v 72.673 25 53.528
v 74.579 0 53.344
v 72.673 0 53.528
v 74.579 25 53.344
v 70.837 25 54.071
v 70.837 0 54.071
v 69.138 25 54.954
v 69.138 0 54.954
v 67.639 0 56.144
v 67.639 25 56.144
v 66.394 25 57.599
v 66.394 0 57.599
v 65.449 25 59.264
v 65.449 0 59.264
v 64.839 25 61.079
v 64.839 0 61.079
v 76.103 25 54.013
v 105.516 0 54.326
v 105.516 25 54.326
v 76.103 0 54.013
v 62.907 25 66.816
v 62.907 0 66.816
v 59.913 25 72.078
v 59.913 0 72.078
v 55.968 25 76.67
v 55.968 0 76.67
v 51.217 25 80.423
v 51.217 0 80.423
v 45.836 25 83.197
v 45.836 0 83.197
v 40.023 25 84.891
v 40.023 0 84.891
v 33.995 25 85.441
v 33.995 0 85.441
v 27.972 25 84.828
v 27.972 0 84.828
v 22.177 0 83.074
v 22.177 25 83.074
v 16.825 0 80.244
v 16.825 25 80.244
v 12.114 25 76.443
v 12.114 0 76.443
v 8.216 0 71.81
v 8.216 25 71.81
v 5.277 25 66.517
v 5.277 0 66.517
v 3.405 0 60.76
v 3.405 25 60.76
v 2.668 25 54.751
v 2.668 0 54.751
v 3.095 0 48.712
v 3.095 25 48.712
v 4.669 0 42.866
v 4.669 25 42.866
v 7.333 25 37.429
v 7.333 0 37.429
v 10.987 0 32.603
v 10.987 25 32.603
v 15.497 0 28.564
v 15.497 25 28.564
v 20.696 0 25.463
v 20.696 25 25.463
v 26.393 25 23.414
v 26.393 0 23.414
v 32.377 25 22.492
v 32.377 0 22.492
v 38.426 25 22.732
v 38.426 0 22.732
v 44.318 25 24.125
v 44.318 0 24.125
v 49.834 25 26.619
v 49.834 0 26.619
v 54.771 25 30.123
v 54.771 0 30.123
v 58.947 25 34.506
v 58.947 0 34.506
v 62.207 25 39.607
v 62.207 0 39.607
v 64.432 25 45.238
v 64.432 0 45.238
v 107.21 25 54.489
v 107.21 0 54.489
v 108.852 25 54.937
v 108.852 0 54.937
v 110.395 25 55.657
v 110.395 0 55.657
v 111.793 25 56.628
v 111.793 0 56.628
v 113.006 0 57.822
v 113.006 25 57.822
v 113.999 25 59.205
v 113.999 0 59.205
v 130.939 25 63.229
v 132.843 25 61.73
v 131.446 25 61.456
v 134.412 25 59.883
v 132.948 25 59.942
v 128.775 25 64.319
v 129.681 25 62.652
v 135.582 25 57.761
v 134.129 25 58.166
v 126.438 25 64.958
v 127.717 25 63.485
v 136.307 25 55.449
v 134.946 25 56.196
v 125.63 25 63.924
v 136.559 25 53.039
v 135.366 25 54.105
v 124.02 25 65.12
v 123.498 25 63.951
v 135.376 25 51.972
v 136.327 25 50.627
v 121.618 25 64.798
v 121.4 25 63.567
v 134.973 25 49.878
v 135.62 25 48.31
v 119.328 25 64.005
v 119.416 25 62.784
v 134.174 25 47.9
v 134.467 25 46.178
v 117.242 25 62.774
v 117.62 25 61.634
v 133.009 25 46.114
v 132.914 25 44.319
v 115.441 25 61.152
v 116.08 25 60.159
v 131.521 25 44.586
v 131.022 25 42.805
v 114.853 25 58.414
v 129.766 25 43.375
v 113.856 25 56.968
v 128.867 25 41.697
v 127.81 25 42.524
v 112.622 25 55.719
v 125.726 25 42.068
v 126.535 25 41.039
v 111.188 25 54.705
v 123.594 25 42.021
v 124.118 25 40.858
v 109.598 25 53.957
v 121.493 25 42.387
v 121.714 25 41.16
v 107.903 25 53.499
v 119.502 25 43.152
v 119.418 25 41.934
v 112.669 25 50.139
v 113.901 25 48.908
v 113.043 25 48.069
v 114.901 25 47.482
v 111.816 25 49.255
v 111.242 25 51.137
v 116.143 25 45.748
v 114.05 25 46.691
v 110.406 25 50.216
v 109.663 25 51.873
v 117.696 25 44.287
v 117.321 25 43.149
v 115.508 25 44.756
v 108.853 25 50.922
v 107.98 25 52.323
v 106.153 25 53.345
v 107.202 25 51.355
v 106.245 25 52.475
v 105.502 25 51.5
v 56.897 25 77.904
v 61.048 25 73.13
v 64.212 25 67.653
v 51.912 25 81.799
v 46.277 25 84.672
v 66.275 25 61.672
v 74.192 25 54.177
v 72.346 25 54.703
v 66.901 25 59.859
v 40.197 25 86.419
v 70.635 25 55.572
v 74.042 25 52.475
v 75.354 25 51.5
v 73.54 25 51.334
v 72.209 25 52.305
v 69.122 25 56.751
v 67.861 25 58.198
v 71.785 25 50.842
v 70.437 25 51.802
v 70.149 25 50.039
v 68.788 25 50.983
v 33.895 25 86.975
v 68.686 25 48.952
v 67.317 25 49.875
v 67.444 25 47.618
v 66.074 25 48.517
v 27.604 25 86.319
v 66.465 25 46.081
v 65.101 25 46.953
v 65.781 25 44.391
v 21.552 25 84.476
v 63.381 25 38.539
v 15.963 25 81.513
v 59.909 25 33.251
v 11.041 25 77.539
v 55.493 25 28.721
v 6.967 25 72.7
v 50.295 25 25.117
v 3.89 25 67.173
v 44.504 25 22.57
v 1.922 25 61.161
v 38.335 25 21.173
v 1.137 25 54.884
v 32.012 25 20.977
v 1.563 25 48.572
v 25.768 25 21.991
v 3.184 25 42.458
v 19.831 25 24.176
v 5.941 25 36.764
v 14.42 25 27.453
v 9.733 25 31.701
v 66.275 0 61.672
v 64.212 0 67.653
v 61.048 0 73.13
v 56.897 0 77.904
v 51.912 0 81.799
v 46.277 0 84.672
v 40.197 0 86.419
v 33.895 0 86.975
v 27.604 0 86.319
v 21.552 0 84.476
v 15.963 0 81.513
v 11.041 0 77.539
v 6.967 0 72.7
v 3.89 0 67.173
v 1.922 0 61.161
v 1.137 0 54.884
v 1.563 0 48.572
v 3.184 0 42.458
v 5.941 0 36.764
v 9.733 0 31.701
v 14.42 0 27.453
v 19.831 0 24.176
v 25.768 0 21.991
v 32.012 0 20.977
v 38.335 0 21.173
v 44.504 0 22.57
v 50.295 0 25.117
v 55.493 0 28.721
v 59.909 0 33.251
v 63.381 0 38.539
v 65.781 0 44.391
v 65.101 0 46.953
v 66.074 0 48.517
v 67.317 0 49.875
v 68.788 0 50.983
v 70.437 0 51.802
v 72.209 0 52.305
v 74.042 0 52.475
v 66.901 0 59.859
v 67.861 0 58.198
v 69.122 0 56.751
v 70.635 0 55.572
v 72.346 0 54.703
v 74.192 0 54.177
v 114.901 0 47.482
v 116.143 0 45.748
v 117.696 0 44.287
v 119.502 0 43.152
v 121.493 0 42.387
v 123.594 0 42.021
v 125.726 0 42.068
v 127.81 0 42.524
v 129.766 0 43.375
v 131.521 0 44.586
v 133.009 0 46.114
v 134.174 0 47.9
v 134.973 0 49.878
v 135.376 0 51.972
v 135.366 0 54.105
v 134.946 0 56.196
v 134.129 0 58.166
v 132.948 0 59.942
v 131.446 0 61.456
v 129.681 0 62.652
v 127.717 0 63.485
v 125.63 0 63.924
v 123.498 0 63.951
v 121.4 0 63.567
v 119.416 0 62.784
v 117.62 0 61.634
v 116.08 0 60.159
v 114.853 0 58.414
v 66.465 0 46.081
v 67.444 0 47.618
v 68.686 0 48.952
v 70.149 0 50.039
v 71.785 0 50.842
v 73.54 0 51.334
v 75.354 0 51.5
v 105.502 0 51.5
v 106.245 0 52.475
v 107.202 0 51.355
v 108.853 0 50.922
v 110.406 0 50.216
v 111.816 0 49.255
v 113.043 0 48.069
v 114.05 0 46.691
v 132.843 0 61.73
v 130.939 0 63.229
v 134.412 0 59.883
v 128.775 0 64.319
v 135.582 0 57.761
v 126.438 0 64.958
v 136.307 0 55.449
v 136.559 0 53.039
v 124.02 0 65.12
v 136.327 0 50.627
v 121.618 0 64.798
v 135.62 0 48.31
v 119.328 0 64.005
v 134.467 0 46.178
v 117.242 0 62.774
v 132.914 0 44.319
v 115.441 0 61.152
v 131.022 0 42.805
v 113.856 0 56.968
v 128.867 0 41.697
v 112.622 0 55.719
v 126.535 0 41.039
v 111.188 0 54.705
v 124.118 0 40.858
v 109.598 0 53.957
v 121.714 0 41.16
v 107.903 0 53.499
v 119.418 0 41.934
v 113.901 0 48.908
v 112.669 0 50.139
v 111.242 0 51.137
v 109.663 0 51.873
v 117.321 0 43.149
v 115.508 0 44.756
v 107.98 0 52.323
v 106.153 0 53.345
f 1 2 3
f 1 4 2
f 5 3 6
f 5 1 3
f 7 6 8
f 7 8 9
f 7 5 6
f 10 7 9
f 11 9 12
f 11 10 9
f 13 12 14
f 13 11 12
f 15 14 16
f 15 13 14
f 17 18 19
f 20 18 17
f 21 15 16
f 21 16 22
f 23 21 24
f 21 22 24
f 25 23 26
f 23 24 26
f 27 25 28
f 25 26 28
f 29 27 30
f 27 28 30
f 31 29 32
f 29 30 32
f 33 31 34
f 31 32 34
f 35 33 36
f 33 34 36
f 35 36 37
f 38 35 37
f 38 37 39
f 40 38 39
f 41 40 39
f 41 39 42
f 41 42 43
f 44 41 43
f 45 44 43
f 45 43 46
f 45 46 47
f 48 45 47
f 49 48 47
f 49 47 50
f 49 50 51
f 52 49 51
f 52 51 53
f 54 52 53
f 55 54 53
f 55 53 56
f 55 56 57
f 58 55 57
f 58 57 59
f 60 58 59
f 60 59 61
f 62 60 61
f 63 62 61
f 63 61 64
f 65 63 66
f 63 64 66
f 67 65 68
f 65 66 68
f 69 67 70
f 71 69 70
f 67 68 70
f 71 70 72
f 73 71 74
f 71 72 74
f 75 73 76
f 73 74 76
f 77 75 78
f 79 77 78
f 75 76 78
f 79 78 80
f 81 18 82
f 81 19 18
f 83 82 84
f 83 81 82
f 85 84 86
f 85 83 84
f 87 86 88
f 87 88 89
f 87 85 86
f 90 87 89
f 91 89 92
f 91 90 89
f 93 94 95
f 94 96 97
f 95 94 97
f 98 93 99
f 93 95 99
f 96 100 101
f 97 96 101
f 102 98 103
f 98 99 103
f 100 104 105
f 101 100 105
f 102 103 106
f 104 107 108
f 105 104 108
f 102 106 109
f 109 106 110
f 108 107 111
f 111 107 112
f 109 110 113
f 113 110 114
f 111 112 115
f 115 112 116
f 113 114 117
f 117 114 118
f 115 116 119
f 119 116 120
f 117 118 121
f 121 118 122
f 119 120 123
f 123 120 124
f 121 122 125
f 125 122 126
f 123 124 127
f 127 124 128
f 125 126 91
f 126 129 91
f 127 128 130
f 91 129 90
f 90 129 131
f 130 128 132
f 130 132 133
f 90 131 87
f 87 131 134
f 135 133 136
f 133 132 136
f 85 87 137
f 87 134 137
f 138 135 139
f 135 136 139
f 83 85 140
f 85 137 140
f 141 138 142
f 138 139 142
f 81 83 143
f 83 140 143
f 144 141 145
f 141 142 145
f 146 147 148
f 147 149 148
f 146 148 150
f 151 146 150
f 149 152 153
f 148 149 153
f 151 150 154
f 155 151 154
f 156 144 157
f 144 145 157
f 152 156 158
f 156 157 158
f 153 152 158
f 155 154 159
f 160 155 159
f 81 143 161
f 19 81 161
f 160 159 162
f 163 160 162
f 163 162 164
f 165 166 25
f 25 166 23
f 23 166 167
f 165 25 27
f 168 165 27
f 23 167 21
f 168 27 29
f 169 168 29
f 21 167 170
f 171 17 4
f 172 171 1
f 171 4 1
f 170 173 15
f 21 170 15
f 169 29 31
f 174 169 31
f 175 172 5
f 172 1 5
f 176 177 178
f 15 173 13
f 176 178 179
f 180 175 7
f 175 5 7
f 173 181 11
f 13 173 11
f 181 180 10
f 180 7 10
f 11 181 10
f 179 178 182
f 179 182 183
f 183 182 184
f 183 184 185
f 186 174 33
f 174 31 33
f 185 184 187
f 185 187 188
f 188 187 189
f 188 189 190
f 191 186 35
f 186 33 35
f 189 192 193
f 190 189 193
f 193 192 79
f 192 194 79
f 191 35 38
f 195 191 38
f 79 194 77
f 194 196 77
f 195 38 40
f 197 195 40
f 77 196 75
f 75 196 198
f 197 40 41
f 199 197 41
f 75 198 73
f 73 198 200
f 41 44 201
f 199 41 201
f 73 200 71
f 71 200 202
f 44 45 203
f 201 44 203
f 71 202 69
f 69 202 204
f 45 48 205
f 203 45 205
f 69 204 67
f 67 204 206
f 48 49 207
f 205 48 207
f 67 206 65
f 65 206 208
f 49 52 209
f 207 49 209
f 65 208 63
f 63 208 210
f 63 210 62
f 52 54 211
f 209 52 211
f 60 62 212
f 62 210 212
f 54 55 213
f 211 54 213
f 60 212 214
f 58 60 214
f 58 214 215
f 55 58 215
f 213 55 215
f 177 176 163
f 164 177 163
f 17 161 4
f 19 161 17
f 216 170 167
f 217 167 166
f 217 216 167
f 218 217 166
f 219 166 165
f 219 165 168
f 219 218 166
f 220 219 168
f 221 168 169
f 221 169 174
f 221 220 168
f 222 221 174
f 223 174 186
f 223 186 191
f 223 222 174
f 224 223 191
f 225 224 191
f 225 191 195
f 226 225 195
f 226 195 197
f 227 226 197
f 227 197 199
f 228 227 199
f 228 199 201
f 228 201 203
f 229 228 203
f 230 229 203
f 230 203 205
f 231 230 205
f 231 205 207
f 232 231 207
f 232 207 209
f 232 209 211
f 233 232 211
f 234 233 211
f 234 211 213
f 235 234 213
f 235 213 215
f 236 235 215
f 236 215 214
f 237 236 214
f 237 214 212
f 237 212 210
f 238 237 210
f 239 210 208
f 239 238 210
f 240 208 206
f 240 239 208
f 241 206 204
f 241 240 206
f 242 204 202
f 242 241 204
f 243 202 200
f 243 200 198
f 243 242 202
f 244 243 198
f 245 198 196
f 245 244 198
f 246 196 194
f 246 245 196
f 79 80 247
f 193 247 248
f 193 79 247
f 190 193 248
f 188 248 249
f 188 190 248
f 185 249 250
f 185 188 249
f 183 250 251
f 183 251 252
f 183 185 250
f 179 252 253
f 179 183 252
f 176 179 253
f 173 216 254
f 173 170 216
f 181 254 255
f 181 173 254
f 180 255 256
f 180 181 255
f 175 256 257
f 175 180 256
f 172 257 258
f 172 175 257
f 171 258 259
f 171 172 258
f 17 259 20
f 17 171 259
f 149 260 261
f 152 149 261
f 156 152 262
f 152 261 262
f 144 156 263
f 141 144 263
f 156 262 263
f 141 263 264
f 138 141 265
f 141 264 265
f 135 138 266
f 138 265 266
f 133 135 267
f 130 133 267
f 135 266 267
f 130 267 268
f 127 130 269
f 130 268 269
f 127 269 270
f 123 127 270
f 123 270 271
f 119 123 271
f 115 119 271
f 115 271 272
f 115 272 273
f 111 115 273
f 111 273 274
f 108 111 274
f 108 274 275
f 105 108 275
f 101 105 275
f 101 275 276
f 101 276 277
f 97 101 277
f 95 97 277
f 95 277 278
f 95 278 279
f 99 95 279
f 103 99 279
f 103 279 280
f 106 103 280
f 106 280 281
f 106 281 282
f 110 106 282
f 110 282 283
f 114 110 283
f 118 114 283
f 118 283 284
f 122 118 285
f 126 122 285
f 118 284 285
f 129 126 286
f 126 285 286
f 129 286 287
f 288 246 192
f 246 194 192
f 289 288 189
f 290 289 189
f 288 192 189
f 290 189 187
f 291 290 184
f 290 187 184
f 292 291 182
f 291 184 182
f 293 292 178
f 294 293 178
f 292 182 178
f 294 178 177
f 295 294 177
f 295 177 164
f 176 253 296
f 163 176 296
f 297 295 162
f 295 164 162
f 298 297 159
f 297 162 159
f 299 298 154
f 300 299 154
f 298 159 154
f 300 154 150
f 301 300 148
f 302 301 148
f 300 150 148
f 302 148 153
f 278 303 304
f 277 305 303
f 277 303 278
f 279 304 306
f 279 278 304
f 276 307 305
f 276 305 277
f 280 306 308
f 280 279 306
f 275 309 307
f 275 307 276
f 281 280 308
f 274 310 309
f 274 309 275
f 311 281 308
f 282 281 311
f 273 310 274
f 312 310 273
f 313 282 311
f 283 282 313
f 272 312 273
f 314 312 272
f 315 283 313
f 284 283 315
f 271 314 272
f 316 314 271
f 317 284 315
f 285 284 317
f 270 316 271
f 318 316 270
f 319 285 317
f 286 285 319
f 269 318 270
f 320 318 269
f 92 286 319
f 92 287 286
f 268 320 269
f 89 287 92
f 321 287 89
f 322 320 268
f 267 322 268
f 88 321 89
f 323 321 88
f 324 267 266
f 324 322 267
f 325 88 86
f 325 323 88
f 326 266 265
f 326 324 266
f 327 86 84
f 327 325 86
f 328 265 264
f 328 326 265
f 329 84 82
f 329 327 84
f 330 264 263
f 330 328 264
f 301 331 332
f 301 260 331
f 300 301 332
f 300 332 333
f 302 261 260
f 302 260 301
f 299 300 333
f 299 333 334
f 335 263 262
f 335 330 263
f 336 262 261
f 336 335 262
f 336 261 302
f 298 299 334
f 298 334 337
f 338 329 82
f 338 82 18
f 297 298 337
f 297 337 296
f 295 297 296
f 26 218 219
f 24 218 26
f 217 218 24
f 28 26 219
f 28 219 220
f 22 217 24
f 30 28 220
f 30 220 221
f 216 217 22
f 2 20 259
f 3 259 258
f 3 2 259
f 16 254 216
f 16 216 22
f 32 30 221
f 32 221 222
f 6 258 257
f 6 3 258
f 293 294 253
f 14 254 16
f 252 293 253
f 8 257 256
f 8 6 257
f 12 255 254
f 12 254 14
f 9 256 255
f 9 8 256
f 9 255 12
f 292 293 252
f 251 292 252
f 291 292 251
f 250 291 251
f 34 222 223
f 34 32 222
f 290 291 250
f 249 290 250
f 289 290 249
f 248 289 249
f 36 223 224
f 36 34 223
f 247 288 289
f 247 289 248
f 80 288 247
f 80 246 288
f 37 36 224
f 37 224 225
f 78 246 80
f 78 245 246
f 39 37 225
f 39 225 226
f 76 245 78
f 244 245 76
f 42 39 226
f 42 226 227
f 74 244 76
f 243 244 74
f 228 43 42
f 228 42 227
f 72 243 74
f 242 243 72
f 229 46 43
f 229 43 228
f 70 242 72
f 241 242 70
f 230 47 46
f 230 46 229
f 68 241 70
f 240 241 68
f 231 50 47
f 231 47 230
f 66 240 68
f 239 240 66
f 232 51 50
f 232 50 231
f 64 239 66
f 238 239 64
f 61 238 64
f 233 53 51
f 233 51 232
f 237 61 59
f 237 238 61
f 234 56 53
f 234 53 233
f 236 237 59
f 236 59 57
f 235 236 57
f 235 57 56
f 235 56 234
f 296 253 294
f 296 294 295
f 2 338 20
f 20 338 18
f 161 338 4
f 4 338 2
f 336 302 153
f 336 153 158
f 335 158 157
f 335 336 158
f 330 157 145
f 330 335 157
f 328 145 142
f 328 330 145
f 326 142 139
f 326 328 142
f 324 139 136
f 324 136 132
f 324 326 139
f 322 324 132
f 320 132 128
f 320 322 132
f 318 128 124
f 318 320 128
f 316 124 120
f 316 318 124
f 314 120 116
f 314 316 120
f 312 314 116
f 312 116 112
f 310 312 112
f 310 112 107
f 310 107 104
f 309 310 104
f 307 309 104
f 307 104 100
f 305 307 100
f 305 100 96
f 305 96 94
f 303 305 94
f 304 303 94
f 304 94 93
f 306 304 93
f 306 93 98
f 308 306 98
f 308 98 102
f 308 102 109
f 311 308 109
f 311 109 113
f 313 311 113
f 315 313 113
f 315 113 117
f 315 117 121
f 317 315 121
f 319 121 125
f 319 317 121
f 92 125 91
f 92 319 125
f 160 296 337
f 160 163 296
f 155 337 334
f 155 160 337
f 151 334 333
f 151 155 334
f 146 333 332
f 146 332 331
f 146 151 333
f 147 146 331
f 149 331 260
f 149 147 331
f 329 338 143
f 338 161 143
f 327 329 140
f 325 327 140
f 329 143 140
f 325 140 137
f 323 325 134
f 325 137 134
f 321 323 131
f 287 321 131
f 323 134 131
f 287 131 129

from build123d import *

# Parameters (mm, degrees)
EXTRUDE_1_DEPTH = 25
FILLET_1_R      = 10
FILLET_2_R      = 10
FILLET_3_R      = 10
FILLET_4_R      = 10


with BuildPart() as part:
    # Эскиз1 → Вытянуть1 (new body)
    with BuildSketch(Plane(origin=(0, 0, 0), x_dir=(1, 0, 0), z_dir=(0, 1, 0))):
        with BuildLine():
            Line((67.101671661, -51.500497432), (112.378503317, -51.500497432))
            ThreePointArc((112.378503317, -51.500497432), (136.559037069, -53.030762447), (112.368799134, -54.399087045))
            Line((112.368799134, -54.399087045), (67.191980368, -53.918527595))
            ThreePointArc((67.191980368, -53.918527595), (1.146798105, -55.174484728), (67.101671661, -51.500497432))
        make_face()
        with BuildLine():
            Line((65.623717724, -52.474815373), (113.434997223, -52.474815373))
            ThreePointArc((113.434997223, -52.474815373), (135.422626362, -53.070517379), (113.428639384, -53.344803486))
            Line((113.428639384, -53.344803486), (65.65222177, -53.344262878))
            ThreePointArc((65.65222177, -53.344262878), (2.674800085, -54.973729362), (65.623717724, -52.474815373))
        make_face(mode=Mode.SUBTRACT)
    extrude(amount=EXTRUDE_1_DEPTH)

    # Скругление1
    fillet_1_edges = [part.edges().sort_by_distance(p)[0] for p in [
        (67.191980368, 12.5, 53.918527595),
    ]]
    fillet(fillet_1_edges, radius=FILLET_1_R)

    # Скругление2
    fillet_2_edges = [part.edges().sort_by_distance(p)[0] for p in [
        (65.65222177, 12.5, 53.344262878),
    ]]
    fillet(fillet_2_edges, radius=FILLET_2_R)

    # Скругление3
    fillet_3_edges = [part.edges().sort_by_distance(p)[0] for p in [
        (65.623717724, 12.5, 52.474815373),
        (67.101671661, 12.5, 51.500497432),
    ]]
    fillet(fillet_3_edges, radius=FILLET_3_R)

    # Скругление4
    fillet_4_edges = [part.edges().sort_by_distance(p)[0] for p in [
        (113.428639384, 12.5, 53.344803486),
        (113.434997223, 12.5, 52.474815373),
        (112.378503317, 12.5, 51.500497432),
        (112.368799134, 12.5, 54.399087045),
    ]]
    fillet(fillet_4_edges, radius=FILLET_4_R)


solid = part.part
